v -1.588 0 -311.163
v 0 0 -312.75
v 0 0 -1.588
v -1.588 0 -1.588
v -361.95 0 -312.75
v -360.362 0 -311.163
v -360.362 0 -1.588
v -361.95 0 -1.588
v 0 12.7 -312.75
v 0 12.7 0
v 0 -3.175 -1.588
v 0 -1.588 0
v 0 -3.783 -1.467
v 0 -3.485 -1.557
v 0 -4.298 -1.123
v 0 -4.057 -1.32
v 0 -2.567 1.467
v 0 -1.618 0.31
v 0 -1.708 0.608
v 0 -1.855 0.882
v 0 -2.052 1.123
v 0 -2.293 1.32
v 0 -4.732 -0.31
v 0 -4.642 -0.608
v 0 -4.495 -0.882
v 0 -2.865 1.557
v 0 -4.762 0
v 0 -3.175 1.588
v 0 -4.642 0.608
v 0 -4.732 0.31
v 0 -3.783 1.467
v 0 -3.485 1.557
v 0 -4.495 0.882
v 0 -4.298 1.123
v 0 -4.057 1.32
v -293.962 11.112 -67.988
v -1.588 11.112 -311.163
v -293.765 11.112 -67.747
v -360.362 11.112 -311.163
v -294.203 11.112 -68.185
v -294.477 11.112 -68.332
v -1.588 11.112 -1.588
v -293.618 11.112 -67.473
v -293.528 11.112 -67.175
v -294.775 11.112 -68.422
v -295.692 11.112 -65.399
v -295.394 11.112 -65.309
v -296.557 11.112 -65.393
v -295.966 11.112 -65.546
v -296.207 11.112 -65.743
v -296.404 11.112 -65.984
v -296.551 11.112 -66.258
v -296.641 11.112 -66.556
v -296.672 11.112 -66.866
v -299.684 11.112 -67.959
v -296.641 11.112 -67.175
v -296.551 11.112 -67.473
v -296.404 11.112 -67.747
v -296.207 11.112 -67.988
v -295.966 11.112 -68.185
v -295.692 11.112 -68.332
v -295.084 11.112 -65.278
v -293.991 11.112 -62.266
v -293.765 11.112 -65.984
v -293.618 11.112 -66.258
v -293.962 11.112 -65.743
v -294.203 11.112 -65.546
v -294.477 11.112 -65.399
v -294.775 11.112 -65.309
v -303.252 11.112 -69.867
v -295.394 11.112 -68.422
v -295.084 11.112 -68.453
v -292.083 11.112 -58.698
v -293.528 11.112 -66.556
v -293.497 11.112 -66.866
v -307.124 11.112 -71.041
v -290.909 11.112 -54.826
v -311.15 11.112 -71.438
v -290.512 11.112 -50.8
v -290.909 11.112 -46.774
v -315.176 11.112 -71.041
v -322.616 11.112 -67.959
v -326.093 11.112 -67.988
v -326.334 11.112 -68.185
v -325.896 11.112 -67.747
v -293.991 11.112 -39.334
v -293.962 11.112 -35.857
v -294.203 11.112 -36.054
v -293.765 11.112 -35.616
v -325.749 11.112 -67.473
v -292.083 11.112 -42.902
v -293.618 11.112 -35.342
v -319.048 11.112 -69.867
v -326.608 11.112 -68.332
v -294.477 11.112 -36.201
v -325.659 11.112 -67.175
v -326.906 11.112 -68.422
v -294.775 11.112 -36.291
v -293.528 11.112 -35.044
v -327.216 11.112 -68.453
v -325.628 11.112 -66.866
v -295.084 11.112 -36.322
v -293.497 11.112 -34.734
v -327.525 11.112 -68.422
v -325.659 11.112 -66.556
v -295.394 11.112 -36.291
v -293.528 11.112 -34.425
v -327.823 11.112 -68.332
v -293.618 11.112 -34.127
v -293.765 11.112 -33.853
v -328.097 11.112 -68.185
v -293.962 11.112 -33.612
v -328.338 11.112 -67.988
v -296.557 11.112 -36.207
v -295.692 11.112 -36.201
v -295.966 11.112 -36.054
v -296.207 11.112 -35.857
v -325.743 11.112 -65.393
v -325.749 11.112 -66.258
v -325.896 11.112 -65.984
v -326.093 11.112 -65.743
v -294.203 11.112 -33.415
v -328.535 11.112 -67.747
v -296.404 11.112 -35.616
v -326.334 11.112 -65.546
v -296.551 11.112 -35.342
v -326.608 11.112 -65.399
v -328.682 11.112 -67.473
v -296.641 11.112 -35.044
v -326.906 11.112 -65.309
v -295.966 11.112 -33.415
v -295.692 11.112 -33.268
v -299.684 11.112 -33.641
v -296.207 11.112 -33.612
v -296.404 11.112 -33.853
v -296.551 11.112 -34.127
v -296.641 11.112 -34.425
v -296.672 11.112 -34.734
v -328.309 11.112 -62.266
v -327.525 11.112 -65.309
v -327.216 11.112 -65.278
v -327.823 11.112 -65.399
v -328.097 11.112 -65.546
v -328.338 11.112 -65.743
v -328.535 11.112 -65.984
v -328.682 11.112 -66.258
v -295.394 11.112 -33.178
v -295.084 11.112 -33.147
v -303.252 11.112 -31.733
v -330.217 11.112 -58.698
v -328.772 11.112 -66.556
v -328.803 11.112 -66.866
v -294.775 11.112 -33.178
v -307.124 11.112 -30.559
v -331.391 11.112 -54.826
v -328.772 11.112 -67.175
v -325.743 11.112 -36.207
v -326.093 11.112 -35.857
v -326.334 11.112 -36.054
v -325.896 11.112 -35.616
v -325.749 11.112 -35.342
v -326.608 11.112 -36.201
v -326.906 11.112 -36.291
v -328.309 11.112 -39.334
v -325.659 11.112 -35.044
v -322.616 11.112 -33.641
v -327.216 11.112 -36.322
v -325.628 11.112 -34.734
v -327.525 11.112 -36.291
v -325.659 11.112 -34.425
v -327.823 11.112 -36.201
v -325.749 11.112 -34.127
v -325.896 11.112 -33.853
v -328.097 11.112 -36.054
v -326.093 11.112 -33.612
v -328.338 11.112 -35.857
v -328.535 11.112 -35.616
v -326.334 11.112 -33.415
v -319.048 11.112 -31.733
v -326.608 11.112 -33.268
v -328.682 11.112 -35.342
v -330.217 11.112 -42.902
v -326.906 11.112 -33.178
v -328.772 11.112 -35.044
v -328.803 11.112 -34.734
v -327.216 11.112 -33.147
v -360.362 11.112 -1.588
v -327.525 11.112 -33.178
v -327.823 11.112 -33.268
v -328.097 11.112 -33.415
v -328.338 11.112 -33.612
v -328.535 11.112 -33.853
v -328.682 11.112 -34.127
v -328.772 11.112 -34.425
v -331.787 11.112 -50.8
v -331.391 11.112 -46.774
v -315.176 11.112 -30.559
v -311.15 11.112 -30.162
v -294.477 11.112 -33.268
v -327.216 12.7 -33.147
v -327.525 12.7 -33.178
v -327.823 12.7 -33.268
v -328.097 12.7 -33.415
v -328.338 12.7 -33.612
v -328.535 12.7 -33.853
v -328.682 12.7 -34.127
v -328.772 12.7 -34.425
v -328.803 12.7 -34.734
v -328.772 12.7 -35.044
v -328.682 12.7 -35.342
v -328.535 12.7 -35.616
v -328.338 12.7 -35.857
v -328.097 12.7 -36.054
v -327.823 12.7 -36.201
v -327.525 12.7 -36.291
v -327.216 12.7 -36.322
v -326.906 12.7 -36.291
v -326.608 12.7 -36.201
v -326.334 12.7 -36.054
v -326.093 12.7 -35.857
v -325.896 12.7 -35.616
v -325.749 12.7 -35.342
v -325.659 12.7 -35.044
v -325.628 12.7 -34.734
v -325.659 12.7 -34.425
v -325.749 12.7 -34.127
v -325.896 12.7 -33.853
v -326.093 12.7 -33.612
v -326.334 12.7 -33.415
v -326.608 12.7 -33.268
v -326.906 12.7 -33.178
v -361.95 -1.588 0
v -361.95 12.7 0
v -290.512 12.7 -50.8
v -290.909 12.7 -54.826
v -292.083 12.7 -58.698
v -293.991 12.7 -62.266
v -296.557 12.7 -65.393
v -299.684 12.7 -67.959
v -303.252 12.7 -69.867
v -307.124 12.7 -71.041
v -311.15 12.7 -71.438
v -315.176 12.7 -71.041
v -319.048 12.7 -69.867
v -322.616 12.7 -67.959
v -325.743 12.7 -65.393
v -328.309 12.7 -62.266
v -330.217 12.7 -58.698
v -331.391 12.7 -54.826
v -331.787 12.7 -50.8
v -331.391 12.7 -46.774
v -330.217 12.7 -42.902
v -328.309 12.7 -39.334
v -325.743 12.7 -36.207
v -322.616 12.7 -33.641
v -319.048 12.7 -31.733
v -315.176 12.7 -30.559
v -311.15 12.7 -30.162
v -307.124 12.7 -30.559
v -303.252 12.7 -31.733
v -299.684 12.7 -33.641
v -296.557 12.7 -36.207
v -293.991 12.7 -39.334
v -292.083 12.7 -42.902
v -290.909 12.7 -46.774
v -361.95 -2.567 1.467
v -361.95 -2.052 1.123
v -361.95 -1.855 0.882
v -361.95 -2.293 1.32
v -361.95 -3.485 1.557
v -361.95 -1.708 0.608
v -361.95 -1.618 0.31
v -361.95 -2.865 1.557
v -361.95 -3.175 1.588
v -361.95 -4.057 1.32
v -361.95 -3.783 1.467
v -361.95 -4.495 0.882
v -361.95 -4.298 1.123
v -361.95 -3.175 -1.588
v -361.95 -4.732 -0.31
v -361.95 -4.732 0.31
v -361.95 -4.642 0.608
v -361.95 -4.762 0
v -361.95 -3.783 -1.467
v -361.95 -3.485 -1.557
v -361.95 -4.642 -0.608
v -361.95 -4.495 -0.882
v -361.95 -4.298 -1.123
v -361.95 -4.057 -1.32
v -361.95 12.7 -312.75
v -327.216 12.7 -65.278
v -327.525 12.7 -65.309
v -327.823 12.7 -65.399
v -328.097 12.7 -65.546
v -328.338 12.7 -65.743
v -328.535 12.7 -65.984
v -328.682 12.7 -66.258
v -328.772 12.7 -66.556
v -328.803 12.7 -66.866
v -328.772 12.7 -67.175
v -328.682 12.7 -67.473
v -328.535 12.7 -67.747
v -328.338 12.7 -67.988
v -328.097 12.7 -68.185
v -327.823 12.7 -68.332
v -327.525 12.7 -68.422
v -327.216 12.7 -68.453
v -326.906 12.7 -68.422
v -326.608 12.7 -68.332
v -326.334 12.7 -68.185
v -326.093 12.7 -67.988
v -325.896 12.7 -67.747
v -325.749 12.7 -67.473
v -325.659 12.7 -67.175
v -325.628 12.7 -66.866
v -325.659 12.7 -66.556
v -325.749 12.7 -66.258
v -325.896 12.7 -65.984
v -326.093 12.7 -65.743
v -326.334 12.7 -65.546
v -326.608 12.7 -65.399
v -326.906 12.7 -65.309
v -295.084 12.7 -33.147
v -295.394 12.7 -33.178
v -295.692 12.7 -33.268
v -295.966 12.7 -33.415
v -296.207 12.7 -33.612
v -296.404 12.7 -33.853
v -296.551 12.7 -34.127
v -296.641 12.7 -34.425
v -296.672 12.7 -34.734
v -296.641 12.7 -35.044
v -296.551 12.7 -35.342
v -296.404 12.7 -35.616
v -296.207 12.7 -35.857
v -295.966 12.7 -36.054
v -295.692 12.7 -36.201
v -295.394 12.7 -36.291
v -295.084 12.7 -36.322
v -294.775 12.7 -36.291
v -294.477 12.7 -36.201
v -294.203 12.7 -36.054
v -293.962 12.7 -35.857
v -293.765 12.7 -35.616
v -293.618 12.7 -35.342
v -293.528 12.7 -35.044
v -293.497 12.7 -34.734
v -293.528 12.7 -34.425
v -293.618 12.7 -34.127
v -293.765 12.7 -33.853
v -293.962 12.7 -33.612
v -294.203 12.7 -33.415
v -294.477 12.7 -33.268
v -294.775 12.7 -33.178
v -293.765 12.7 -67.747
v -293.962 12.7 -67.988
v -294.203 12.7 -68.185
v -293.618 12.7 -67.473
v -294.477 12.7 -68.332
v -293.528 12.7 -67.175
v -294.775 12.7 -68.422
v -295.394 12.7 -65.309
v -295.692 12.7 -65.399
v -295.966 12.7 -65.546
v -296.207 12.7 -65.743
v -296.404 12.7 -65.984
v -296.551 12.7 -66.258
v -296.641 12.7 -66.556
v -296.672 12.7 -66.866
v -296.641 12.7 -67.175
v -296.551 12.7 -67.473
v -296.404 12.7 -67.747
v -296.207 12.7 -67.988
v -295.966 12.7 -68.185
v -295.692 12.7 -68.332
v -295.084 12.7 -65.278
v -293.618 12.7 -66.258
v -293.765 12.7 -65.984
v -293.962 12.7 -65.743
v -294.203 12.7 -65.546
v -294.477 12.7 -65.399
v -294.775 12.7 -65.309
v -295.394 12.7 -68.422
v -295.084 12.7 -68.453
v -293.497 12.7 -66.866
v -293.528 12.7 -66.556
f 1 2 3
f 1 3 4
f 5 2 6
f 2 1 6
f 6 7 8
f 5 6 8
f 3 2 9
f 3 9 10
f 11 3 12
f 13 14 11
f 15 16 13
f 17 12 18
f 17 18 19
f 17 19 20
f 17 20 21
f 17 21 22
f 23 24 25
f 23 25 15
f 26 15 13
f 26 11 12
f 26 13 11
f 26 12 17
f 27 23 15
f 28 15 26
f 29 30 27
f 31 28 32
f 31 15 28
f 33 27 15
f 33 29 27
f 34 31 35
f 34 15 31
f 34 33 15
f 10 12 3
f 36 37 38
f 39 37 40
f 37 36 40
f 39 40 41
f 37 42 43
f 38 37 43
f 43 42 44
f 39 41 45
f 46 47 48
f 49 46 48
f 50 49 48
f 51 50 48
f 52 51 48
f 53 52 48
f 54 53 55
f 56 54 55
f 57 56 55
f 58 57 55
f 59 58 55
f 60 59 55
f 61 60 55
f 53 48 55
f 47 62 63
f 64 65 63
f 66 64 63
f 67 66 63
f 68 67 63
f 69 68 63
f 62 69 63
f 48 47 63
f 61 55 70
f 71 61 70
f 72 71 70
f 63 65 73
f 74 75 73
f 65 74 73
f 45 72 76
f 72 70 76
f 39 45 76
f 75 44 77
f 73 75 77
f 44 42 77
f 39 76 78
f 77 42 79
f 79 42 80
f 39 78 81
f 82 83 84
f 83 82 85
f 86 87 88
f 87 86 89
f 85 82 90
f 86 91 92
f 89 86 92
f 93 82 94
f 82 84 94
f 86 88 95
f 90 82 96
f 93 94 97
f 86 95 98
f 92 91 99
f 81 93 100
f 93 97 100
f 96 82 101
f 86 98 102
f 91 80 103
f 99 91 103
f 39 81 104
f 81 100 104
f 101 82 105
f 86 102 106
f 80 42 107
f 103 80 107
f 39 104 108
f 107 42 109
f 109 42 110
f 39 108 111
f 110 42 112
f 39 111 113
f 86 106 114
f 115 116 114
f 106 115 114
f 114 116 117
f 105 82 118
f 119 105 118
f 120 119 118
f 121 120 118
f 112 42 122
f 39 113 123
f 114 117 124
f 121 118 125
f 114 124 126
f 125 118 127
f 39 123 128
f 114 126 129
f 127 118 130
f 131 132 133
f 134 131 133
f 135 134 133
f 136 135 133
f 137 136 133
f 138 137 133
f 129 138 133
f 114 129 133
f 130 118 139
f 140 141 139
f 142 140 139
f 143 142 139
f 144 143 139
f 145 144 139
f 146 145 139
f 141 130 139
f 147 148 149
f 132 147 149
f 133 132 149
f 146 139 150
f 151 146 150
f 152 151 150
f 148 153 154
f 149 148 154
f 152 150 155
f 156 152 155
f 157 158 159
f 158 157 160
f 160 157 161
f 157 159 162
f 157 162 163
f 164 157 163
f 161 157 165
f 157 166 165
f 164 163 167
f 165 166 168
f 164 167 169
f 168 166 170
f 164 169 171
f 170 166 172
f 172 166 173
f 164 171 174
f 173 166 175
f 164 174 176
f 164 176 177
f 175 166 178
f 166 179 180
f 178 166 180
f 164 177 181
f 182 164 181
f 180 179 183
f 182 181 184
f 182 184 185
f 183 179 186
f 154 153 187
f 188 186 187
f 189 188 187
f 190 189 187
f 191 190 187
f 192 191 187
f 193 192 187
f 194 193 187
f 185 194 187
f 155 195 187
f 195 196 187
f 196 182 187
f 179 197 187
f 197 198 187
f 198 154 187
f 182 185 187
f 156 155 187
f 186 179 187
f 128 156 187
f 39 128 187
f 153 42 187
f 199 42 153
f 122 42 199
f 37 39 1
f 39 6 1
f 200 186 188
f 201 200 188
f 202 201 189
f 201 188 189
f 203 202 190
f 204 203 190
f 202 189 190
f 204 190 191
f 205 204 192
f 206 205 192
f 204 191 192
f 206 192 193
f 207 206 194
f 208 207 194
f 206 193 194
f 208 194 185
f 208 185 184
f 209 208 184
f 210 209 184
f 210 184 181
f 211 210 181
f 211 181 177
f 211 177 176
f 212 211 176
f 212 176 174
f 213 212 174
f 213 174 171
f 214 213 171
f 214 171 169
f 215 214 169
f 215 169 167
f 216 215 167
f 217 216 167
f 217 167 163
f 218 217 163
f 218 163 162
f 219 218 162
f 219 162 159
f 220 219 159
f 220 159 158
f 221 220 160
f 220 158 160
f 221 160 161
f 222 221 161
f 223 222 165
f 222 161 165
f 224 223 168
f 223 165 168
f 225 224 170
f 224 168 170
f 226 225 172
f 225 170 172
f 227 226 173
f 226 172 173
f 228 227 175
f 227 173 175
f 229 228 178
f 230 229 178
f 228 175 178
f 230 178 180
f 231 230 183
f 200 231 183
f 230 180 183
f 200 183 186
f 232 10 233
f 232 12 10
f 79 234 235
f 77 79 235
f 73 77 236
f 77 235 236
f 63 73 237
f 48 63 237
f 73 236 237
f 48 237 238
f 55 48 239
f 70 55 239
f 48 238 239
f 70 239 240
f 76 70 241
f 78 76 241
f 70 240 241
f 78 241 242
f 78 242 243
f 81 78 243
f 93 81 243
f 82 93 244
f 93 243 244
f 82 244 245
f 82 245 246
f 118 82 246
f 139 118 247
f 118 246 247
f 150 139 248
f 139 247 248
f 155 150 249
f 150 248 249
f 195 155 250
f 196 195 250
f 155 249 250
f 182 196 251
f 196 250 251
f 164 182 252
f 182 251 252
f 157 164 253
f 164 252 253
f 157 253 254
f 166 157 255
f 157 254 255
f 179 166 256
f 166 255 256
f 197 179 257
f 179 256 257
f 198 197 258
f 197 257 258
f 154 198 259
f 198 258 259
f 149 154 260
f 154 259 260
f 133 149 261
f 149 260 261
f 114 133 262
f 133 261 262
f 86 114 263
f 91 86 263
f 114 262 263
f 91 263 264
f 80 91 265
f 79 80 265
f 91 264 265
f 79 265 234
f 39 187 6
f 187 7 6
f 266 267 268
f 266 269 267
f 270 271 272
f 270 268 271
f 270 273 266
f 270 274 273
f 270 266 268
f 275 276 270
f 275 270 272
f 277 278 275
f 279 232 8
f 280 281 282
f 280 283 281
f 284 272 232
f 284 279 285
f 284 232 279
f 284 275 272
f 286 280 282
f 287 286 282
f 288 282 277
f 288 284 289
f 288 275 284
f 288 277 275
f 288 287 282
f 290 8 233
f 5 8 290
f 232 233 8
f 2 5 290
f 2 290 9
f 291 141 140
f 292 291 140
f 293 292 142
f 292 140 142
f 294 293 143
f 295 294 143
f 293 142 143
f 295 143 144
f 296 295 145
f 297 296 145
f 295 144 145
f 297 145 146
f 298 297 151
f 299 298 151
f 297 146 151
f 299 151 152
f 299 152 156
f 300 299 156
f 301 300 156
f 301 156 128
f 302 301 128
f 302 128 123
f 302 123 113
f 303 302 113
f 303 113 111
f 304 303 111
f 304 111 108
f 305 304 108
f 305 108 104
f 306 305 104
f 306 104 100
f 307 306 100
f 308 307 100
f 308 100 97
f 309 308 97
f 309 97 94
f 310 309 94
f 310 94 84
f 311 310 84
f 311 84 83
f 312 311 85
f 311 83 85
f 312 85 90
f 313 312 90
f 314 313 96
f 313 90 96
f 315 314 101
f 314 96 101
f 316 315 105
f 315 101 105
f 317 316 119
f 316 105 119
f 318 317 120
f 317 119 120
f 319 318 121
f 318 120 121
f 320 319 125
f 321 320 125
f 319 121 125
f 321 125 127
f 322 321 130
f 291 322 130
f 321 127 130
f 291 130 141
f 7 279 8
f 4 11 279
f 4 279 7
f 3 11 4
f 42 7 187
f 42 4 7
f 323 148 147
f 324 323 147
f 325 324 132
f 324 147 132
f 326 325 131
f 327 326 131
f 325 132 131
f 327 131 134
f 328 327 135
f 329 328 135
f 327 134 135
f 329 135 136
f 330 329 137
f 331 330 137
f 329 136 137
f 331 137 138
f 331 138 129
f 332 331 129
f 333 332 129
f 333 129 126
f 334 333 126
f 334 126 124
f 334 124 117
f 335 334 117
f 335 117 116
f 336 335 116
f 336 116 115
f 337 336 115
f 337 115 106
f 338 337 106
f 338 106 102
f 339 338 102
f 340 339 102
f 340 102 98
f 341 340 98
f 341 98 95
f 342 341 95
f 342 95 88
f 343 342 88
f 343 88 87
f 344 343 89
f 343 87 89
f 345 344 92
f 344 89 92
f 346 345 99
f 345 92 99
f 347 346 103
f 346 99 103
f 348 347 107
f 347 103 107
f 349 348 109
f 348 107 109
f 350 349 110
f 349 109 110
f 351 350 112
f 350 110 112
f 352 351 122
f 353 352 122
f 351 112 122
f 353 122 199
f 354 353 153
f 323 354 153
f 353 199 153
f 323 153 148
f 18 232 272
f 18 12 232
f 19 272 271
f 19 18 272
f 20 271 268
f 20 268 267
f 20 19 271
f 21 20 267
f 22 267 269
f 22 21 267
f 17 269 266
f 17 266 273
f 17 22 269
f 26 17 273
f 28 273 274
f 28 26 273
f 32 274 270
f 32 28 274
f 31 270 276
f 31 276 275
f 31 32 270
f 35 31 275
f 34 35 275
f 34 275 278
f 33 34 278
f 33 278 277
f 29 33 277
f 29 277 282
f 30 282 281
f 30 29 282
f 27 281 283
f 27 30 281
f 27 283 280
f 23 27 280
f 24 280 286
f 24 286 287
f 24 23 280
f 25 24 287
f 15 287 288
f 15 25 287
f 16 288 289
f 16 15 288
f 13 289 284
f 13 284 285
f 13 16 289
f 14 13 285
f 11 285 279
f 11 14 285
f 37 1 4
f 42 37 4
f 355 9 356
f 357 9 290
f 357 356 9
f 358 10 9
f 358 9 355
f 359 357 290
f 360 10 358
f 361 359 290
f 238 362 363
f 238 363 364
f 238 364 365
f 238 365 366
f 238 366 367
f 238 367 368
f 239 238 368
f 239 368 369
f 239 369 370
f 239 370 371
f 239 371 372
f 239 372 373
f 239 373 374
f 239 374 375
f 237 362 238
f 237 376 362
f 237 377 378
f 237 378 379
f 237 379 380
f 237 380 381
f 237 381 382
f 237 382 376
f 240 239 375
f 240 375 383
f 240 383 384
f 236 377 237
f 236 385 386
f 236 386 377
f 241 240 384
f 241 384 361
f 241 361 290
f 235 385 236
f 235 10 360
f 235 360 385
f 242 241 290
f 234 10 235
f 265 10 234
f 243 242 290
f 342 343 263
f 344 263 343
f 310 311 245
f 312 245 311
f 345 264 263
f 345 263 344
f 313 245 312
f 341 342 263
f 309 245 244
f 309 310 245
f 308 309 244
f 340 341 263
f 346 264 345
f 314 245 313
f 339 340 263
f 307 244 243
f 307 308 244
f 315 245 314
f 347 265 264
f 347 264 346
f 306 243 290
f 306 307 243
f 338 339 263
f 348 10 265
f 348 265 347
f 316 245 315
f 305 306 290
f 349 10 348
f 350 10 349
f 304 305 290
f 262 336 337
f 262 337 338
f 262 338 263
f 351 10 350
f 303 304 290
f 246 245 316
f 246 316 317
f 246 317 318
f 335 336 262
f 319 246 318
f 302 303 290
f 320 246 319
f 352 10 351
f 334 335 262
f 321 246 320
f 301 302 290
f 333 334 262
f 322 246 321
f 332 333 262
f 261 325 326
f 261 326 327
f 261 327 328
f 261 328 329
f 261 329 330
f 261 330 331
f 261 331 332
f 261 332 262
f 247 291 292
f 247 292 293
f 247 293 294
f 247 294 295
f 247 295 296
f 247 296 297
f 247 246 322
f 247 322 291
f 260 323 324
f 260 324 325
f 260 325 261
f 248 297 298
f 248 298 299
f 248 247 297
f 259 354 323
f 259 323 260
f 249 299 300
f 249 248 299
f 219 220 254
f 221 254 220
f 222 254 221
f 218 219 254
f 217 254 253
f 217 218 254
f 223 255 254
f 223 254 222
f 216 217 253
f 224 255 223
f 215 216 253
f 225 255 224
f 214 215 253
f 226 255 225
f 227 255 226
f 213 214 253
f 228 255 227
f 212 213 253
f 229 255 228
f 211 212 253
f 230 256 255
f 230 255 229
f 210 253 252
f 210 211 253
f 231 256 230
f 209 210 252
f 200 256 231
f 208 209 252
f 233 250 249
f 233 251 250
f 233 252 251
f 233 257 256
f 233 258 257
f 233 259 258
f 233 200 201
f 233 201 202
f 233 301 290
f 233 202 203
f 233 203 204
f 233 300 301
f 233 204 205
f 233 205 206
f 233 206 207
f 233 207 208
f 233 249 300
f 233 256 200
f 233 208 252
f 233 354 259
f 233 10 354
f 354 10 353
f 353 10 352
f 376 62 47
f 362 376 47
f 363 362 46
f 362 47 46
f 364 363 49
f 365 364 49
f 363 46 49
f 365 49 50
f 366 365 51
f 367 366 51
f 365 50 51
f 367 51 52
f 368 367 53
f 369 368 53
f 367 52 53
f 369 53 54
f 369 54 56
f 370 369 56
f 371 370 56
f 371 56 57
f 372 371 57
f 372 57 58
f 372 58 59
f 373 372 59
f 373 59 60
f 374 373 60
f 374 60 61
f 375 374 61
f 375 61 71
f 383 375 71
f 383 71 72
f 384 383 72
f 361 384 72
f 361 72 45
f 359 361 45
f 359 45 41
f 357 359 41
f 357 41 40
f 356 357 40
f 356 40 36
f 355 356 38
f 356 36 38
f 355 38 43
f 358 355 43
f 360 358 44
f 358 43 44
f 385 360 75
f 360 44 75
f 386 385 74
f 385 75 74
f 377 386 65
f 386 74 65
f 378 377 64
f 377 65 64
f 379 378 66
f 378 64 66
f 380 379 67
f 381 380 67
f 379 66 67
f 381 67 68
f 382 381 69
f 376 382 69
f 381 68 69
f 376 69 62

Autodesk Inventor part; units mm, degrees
ref_plane "YZ Plane" through (0, 0, 0) normal (1, 0, 0) x (0, 1, 0)
ref_plane "XZ Plane" through (0, 0, 0) normal (0, 1, 0) x (-1, 0, 0)
ref_plane "XY Plane" through (0, 0, 0) normal (0, 0, 1) x (1, 0, 0)
sketch "Sketch1" plane through (0, 0, 0) normal (0, 1, 0) x (-1, 0, 0)
  line L0 (0, 0) -> (361.95, 0)
  line L1 (361.95, 0) -> (361.95, -312.7502)
  line L2 (361.95, -312.7502) -> (0, -312.7502)
  line L3 (0, -312.7502) -> (0, 0)
  dimension "d0" = 361.95
  dimension "d1" = 312.7502
extrude "Extrusion1" add sketch "Sketch1" along normal blind 12.7
shell "Shell1" thickness 1.5875 removed faces 1 at (-120.65, 0, -104.2501)
sketch "Sketch2" plane through (0, 0, 0) normal (1, 0, 0) x (0, 0, -1)
  line L0 (0, 0) -> (0, -3.175)
  arc A0 (0, -1.5875) -> (1.5875, -3.175) centre (0, -3.175) ccw
  line L1 (1.5875, -3.175) -> (1.5875, 0)
  line L2 (312.7502, 0) -> (0, 0) projected
  line L3 (1.5875, 0) -> (0, 0)
  dimension "d5" = 3.175
  dimension "d6" = 3.175
extrude "Extrusion2" add sketch "Sketch2" against normal up to surface (361.95 mm away)
sketch "Sketch3" plane through (0, 12.7, 0) normal (0, 1, 0) x (1, 0, 0)
  line L0 (-361.95, 312.7502) -> (-361.95, 0) construction
  line L1 (-361.95, 0) -> (-311.15, 0) construction
  line L2 (-311.15, 0) -> (-311.15, 50.8) construction
  line L3 (-311.15, 50.8) -> (-361.95, 50.8) construction
  line L4 (-361.95, 50.8) -> (-361.95, 0) construction
  circle A0 centre (-311.15, 50.8) radius 20.6375
  point P0 (0, 0)
  dimension "d9" = 50.8
  dimension "d10" = 50.8
  dimension "d11" = 41.275
extrude "Extrusion3" cut sketch "Sketch3" against normal blind 12.7
sketch "Sketch4" plane through (0, 12.7, 0) normal (0, 1, 0) x (1, 0, 0)
  circle A0 centre (-311.15, 50.8) radius 20.6375 construction
  line L0 (-311.15, 50.8) -> (-295.0845, 50.8) construction
  line L1 (-295.0845, 50.8) -> (-295.0845, 66.8655) construction
  line L2 (-295.0845, 66.8655) -> (-311.15, 66.8655) construction
  line L3 (-311.15, 66.8655) -> (-311.15, 50.8) construction
  line L4 (-311.15, 50.8) -> (-327.2155, 50.8) construction
  line L5 (-327.2155, 50.8) -> (-327.2155, 34.7345) construction
  line L6 (-327.2155, 34.7345) -> (-311.15, 34.7345) construction
  line L7 (-311.15, 34.7345) -> (-311.15, 50.8) construction
  line L8 (-295.0845, 66.8655) -> (-327.2155, 66.8655)
  line L9 (-327.2155, 66.8655) -> (-327.2155, 34.7345)
  line L10 (-327.2155, 34.7345) -> (-295.0845, 34.7345)
  line L11 (-295.0845, 34.7345) -> (-295.0845, 66.8655)
  point P0 (0, 0)
  dimension "d14" = 16.0655
  dimension "d15" = 16.0655
  dimension "d16" = 16.0655
  dimension "d17" = 16.0655
hole "Hole1" at (-327.2155, 12.7, -66.8655) at (-295.0845, 12.7, -66.8655) at (-295.0845, 12.7, -34.7345) at (-327.2155, 12.7, -34.7345) direction (0, -1, 0) diameter 3.175 depth 25.4 tip angle 118
equation "\"d15\" = d14"
equation "\"d16\" = d14"
equation "\"d17\" = d14"
properties part number "lid" material "Steel"
